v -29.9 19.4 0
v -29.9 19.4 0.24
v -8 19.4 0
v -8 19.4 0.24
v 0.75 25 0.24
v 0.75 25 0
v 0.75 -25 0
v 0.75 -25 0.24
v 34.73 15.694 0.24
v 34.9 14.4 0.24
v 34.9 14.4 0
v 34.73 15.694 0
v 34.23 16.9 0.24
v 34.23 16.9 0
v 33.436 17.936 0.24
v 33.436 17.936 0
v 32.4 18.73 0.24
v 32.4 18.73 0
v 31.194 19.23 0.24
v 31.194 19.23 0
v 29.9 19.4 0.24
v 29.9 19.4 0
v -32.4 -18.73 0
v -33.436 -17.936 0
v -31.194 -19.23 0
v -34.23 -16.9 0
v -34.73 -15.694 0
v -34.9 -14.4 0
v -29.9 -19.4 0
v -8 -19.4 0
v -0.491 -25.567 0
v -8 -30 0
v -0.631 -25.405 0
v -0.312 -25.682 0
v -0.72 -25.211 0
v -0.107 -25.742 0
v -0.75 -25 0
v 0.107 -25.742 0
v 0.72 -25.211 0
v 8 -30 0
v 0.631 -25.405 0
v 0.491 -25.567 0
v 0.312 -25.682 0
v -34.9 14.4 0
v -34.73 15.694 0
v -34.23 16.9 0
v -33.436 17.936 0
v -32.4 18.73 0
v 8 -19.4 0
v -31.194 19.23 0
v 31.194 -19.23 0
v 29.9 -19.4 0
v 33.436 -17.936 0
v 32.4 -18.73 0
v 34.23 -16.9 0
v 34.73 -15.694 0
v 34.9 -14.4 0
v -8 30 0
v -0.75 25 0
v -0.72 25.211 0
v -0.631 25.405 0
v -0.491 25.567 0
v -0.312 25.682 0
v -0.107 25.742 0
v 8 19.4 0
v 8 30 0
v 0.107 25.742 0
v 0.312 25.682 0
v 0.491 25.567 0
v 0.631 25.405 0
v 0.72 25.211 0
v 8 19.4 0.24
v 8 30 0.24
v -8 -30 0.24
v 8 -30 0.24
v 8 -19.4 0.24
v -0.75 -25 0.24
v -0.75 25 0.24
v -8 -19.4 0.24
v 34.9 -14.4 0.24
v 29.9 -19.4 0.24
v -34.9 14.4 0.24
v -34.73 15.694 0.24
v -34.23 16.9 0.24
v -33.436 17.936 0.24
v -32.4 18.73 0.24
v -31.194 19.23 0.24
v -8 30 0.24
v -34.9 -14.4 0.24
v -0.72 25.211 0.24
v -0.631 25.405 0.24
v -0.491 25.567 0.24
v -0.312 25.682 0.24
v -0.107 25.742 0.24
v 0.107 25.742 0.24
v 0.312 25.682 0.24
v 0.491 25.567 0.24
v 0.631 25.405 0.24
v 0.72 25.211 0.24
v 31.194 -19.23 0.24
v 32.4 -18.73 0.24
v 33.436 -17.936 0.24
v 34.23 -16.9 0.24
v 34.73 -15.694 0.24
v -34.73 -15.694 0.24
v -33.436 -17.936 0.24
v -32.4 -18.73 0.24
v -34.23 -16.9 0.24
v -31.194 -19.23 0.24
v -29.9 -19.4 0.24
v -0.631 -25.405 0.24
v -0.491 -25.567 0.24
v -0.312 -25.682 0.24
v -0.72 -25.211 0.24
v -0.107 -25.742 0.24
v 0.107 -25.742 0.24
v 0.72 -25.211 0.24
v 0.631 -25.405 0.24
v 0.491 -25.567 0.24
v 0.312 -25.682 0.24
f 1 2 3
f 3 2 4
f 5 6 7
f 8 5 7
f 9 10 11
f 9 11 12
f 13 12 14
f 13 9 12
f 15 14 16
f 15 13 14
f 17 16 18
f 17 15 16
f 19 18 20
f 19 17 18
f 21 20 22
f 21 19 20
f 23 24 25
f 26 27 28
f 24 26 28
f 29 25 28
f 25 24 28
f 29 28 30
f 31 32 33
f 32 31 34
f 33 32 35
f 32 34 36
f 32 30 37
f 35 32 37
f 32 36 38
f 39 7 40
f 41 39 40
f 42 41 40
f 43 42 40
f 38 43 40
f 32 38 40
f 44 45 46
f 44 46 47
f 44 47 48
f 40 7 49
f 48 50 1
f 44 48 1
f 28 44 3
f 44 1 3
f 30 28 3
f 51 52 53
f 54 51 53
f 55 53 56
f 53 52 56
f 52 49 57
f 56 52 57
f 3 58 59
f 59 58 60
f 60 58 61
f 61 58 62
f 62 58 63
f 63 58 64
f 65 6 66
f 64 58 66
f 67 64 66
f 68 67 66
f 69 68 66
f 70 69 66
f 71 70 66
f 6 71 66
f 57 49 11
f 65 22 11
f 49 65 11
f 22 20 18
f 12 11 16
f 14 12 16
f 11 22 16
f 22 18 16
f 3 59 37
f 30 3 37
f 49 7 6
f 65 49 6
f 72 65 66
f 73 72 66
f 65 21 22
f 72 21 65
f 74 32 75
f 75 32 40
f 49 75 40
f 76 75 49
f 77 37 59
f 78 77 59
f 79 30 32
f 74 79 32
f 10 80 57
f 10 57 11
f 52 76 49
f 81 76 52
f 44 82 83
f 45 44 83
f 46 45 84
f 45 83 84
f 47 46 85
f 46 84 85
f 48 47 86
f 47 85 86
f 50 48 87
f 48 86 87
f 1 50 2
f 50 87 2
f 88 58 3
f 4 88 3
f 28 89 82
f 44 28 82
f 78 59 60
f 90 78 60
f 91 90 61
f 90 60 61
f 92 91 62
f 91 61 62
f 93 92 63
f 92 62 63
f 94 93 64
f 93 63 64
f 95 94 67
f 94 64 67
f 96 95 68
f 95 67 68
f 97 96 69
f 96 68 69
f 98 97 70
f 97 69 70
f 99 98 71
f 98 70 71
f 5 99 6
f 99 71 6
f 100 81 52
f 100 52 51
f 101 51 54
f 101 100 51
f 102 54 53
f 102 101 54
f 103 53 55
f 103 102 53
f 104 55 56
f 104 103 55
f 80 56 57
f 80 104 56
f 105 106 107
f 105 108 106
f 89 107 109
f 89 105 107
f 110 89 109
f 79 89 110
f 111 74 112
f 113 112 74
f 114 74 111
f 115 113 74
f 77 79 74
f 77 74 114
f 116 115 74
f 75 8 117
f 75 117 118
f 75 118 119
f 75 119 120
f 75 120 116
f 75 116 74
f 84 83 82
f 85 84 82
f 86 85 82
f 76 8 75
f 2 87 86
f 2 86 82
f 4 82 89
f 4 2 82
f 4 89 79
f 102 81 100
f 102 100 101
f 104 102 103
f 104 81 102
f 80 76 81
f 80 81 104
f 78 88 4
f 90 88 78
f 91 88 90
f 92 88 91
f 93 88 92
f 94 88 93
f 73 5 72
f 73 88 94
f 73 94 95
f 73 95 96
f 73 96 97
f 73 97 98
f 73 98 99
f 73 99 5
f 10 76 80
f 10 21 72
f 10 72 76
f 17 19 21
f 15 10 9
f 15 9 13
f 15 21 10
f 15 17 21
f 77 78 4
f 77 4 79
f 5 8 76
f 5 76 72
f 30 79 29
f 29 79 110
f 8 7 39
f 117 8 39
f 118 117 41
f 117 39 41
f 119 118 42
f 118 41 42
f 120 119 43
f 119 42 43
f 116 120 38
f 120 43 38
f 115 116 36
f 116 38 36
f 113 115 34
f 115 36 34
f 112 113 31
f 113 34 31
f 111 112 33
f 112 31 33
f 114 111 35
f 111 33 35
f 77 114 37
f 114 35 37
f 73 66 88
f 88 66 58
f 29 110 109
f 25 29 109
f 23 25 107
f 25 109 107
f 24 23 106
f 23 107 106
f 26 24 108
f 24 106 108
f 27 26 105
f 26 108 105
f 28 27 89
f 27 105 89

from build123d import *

# Parameters (mm, degrees)
EXTRUDE_1_DEPTH     = 0.24
CUT_EXTRUDE_1_DEPTH = 49.415468603


with BuildPart() as part:
    # 草圖1 → 填料-伸長1 (new body)
    with BuildSketch(Plane.XY):
        Polygon((8, 30), (-8, 30), (-8, 20), (-38, 20), (-38, -20), (-8, -20), (-8, -30), (8, -30), (8, -20), (38, -20), (38, 20), (8, 20), align=None)
        with BuildLine():
            Line((-0.75, -25), (-0.75, 25))
            ThreePointArc((-0.75, 25), (0, 25.75), (0.75, 25))
            Line((0.75, 25), (0.75, -25))
            ThreePointArc((0.75, -25), (0, -25.75), (-0.75, -25))
        make_face(mode=Mode.SUBTRACT)
    extrude(amount=EXTRUDE_1_DEPTH)

    # 草圖2 → 除料-伸長1 (cut, through all)
    with BuildSketch(Plane.XY.offset(0.24)):
        with BuildLine():
            Line((-8, 20), (-38, 20))
            Line((-38, 20), (-38, -20))
            Line((-38, -20), (-8, -20))
            Line((-8, -20), (-8, -19.4))
            Line((-8, -19.4), (-29.9, -19.4))
            ThreePointArc((-29.9, -19.4), (-33.435533906, -17.935533906), (-34.9, -14.4))
            Line((-34.9, -14.4), (-34.9, 14.4))
            ThreePointArc((-34.9, 14.4), (-33.435533906, 17.935533906), (-29.9, 19.4))
            Line((-29.9, 19.4), (-8, 19.4))
            Line((-8, 19.4), (-8, 20))
        make_face()
        with BuildLine():
            Line((8, 19.4), (8, 20))
            Line((8, 20), (38, 20))
            Line((38, 20), (38, -20))
            Line((38, -20), (8, -20))
            Line((8, -20), (8, -19.4))
            Line((8, -19.4), (29.9, -19.4))
            ThreePointArc((29.9, -19.4), (33.435533906, -17.935533906), (34.9, -14.4))
            Line((34.9, -14.4), (34.9, 14.4))
            ThreePointArc((34.9, 14.4), (33.435533906, 17.935533906), (29.9, 19.4))
            Line((29.9, 19.4), (8, 19.4))
        make_face()
    extrude(amount=-CUT_EXTRUDE_1_DEPTH, mode=Mode.SUBTRACT)


solid = part.part
